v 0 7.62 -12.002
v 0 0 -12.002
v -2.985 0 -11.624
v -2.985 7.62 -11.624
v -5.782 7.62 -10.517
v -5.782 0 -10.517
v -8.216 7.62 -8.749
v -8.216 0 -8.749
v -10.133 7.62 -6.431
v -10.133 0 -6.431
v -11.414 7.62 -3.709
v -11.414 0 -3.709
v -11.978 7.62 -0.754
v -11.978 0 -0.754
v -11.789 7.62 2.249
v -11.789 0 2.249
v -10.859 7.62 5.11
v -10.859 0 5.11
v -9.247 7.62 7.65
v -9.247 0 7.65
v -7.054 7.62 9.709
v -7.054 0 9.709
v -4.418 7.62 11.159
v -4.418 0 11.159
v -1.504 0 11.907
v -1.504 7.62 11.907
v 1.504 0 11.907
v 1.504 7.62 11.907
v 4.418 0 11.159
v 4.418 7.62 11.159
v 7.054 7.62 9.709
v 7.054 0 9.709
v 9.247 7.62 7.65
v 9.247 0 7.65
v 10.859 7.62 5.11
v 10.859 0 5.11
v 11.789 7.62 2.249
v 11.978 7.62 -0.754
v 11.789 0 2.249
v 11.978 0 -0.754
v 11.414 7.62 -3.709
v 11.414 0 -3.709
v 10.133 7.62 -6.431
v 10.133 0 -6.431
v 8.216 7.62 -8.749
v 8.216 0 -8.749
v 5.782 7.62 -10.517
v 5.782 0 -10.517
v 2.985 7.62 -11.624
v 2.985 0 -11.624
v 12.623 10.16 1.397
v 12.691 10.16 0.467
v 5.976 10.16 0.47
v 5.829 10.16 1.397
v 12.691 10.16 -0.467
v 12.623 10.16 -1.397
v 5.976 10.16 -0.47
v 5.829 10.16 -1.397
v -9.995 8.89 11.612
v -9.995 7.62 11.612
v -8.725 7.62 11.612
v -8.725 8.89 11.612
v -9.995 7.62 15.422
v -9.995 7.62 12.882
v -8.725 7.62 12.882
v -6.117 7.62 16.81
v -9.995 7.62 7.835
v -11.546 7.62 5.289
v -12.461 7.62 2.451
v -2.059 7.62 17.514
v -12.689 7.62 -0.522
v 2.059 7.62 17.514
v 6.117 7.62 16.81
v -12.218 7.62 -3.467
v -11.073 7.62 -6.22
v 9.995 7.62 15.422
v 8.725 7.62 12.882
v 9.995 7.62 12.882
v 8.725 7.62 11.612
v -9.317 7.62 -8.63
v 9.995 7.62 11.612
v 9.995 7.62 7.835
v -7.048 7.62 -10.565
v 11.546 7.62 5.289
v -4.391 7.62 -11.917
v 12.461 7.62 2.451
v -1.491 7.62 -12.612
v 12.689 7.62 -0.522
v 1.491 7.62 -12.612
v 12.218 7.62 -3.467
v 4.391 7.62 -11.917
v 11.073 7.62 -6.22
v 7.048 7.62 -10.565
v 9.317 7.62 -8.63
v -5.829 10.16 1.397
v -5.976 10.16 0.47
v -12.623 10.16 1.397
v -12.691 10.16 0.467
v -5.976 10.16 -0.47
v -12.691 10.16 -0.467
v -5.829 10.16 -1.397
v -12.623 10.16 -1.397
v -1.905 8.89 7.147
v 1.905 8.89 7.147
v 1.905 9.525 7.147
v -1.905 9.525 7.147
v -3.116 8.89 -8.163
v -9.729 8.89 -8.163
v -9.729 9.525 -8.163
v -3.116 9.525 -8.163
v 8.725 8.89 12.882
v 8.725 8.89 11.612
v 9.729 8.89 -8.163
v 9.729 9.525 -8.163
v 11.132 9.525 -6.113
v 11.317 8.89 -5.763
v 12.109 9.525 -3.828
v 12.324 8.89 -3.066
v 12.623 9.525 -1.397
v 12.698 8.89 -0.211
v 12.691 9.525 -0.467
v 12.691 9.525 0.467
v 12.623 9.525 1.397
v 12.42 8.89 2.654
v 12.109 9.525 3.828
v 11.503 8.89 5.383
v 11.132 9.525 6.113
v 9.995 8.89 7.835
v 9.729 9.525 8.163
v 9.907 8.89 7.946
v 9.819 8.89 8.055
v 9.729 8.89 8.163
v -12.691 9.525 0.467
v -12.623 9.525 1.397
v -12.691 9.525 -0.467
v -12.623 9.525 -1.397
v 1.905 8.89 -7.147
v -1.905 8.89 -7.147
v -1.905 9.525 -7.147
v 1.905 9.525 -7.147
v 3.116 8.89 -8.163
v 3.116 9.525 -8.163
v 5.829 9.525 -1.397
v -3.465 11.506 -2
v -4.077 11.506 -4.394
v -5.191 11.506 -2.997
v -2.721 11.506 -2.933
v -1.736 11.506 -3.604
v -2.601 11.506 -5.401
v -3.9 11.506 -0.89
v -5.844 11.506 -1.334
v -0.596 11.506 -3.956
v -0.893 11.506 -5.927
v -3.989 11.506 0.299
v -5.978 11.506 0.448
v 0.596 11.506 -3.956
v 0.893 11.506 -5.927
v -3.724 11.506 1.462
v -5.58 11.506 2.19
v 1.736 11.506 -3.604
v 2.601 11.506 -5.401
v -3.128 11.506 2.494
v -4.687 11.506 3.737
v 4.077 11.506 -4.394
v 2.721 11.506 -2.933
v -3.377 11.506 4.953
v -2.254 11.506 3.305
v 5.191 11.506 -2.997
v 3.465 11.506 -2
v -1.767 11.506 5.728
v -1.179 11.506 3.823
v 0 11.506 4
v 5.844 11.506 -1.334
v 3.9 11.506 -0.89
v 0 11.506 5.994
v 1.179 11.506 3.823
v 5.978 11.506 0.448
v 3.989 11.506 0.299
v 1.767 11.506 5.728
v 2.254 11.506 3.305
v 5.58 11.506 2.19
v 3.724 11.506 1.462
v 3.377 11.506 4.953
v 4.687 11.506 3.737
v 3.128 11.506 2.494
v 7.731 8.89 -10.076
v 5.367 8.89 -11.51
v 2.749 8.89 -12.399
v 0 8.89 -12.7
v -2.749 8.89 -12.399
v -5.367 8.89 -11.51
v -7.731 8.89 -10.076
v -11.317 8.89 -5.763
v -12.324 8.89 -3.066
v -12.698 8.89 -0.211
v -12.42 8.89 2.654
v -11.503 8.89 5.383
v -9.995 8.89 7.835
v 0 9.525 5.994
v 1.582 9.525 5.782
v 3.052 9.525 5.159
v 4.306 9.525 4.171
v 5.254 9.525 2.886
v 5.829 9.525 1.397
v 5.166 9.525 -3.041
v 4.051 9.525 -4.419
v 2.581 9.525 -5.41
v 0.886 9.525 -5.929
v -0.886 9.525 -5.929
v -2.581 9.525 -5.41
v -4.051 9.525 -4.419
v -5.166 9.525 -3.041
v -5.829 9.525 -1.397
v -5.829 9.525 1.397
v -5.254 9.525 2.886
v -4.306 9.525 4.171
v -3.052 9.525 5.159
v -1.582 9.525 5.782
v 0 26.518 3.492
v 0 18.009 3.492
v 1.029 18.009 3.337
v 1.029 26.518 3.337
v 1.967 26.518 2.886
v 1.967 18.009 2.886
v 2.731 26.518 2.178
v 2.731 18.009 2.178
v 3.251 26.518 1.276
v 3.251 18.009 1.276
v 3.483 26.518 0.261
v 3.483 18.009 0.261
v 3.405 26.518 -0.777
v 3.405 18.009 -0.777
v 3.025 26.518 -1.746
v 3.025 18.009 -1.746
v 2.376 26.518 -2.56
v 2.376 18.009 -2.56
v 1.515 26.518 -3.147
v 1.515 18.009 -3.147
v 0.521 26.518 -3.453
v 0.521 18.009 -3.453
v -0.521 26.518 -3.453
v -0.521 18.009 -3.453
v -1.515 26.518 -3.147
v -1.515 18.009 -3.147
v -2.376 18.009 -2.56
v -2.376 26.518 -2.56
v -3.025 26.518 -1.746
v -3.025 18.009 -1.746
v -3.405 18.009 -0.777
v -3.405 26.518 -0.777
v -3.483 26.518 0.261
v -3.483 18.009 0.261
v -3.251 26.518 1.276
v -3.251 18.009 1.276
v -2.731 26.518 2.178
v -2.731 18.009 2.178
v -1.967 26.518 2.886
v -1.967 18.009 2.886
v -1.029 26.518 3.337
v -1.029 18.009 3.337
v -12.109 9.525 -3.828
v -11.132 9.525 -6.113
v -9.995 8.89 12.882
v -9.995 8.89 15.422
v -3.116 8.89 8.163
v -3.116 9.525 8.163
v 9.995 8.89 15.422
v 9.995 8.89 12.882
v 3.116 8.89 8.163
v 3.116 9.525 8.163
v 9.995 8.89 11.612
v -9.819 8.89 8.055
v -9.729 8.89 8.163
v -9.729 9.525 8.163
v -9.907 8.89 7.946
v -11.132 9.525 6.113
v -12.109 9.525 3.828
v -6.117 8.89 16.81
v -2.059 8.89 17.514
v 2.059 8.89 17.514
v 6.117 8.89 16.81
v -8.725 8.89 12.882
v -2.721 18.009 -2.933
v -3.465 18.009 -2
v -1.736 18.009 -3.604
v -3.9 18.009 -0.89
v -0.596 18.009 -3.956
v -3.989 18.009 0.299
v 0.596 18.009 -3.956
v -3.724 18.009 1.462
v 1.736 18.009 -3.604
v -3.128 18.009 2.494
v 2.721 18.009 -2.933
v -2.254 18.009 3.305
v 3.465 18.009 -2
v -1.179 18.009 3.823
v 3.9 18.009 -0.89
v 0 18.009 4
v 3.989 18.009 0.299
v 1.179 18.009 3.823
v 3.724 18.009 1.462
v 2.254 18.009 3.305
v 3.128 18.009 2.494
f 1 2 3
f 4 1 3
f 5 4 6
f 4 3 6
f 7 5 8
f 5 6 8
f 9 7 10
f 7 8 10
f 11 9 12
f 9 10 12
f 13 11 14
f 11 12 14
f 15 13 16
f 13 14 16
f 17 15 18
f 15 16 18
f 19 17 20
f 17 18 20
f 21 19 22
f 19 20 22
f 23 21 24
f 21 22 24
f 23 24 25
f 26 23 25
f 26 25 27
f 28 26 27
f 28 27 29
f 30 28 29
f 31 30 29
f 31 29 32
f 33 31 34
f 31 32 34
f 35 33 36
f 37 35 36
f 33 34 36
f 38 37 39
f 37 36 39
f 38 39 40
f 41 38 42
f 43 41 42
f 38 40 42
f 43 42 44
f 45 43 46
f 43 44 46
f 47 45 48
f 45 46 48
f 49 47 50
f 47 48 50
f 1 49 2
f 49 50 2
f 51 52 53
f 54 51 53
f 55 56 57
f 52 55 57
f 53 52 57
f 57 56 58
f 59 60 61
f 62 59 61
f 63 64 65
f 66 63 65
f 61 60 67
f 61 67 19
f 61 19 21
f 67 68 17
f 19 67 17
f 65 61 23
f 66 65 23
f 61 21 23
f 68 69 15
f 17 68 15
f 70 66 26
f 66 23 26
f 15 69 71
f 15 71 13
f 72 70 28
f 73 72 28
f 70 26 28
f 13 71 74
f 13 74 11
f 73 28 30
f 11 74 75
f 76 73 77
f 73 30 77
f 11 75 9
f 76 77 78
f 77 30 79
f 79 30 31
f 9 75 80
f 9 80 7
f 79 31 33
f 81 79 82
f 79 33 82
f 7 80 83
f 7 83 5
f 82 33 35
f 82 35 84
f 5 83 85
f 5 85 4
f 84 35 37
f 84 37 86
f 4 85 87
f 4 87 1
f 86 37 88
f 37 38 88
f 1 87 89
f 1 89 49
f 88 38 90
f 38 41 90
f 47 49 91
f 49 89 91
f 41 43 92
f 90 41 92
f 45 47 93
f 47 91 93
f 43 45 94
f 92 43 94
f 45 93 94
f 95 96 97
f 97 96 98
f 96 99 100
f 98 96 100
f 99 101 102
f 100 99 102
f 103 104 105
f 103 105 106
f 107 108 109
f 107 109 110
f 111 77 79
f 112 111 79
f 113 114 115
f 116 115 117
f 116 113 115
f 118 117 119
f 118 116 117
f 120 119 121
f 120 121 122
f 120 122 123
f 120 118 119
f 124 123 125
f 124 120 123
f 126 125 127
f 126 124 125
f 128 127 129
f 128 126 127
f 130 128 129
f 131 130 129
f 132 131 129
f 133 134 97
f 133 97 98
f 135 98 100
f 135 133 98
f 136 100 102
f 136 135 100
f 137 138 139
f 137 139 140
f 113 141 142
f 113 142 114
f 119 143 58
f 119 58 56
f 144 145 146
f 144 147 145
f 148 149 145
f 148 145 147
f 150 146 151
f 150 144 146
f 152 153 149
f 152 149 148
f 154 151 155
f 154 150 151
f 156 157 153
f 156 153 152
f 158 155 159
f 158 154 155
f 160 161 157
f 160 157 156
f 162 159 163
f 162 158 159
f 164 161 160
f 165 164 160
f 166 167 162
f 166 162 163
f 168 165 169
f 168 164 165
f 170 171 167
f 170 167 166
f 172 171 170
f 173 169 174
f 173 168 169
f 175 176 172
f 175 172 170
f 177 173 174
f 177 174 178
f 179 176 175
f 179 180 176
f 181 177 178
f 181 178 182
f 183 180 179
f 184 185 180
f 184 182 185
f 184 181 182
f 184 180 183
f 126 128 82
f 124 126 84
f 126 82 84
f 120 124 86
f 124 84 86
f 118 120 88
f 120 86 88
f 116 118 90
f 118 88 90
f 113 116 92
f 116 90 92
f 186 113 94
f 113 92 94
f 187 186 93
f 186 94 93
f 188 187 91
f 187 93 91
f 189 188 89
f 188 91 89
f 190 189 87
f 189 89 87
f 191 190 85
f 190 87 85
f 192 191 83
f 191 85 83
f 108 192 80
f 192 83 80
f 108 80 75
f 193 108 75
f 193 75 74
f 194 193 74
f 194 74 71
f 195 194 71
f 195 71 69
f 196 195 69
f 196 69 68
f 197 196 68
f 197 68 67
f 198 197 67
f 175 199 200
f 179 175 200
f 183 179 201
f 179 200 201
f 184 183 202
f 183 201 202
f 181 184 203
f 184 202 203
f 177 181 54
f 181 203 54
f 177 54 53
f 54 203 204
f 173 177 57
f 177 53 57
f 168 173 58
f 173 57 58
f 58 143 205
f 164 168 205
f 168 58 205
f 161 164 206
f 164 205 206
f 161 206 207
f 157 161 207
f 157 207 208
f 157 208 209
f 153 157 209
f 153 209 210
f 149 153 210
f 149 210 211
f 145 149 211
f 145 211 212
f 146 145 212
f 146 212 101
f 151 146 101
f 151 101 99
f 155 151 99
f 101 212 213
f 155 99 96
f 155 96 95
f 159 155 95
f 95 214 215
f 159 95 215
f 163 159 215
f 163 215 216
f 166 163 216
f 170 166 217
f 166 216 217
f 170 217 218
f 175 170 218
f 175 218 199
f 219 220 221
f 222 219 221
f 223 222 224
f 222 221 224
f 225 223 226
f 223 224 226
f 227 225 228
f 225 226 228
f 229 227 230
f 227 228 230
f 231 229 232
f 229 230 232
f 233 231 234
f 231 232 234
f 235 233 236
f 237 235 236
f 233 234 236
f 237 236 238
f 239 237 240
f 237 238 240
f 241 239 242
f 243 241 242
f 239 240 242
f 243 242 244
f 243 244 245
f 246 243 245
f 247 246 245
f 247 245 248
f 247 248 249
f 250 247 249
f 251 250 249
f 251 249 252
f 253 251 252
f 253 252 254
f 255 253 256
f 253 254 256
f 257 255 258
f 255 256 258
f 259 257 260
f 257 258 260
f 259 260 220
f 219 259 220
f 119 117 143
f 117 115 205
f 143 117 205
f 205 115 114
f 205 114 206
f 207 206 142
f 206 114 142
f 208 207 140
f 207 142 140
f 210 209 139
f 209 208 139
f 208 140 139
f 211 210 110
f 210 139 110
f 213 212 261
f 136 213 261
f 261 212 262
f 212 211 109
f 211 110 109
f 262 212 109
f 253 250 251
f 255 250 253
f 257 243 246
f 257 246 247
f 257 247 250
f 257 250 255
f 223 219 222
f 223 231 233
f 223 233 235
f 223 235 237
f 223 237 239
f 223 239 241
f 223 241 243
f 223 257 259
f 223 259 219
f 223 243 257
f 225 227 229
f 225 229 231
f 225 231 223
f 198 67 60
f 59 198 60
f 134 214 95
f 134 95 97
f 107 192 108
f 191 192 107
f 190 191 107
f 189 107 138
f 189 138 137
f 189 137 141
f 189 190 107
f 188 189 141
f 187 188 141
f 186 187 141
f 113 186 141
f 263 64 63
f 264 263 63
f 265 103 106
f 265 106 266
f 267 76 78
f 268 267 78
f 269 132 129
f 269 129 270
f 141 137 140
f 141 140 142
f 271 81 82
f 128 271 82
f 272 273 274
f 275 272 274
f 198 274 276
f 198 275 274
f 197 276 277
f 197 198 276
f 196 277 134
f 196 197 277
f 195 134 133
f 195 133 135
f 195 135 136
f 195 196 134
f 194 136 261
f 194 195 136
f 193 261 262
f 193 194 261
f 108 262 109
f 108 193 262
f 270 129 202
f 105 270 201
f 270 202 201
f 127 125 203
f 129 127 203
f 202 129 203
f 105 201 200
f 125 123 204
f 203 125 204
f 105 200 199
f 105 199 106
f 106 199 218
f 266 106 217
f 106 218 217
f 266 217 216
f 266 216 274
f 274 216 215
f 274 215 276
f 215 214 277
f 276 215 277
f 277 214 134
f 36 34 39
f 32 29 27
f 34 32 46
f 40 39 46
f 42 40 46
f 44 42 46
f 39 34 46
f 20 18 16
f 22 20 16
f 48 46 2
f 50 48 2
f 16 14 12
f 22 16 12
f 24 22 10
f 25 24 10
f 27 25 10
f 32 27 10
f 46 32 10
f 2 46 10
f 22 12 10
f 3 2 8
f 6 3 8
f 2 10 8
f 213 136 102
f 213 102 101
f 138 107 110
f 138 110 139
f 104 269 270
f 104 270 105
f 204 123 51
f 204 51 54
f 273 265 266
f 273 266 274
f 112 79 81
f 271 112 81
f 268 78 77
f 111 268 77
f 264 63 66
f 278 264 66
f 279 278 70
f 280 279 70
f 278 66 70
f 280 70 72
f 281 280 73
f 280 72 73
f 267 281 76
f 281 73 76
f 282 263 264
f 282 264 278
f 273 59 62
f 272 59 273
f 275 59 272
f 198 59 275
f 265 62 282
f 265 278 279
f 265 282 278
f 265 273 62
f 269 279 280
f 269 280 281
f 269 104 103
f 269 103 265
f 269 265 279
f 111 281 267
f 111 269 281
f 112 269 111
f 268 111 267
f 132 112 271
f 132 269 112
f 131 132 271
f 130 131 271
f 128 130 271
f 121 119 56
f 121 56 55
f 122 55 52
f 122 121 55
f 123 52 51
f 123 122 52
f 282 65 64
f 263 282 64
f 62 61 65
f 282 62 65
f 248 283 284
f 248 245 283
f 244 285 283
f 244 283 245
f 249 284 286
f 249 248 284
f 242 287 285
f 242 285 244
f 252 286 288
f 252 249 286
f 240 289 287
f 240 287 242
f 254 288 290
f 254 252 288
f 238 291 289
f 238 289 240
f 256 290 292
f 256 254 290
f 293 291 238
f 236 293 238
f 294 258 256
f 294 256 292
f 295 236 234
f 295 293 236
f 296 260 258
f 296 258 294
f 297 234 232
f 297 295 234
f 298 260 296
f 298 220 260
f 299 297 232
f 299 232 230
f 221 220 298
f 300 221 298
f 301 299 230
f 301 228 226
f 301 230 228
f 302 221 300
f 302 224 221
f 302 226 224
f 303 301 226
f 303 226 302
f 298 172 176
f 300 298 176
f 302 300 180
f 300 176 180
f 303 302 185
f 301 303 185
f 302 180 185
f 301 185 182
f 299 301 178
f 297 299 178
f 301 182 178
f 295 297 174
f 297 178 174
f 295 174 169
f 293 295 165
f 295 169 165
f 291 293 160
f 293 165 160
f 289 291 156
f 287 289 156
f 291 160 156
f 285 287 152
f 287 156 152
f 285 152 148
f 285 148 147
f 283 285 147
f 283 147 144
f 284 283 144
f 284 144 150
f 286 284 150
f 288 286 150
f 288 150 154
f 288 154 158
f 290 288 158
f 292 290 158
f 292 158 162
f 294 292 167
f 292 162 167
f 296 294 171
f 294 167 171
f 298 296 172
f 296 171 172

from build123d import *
from build123d.topology import SkipClean

# Parameters (mm, degrees)
SKETCH1_R           = 12.0015
BOSS_EXTRUDE1_DEPTH = 7.62
SKETCH2_R           = 12.7
BOSS_EXTRUDE2_DEPTH = 1.27
BOSS_EXTRUDE3_START = -1.27
BOSS_EXTRUDE3_DEPTH = 1.27
SKETCH4_R           = 5.9944
BOSS_EXTRUDE4_DEPTH = 2.6162
SKETCH5_R           = 4.0005
BOSS_EXTRUDE5_DEPTH = 6.5024
SKETCH6_R           = 3.4925
BOSS_EXTRUDE6_DEPTH = 8.509
BOSS_EXTRUDE7_DEPTH = 0.635
BOSS_EXTRUDE8_DEPTH = 0.635


with BuildPart() as part:
    # Sketch1 → Boss-Extrude1 (new body)
    with BuildSketch(Plane(origin=(0, 0, 0), x_dir=(1, 0, 0), z_dir=(0, 1, 0))):
        with Locations(Location((0, 0, 0), (0, 0, 90))):
            Circle(SKETCH1_R)
    extrude(amount=BOSS_EXTRUDE1_DEPTH)

    # Sketch2 → Boss-Extrude2 (add)
    with BuildSketch(Plane(origin=(0, 7.62, 0), x_dir=(1, 0, 0), z_dir=(0, 1, 0))):
        with Locations(Location((0, 0, 0), (0, 0, 270))):
            Circle(SKETCH2_R)
    extrude(amount=BOSS_EXTRUDE2_DEPTH)

    # Sketch3 → Boss-Extrude3 (add)
    with BuildSketch(Plane(origin=(0, 8.89, 0), x_dir=(1, 0, 0), z_dir=(0, 1, 0)).offset(BOSS_EXTRUDE3_START)):
        with BuildLine():
            ThreePointArc((9.9949, -7.835303057), (0, -12.7), (-9.9949, -7.835303057))
            Line((-9.9949, -7.835303057), (-9.9949, -11.612260807))
            Line((-9.9949, -11.612260807), (-8.7249, -11.612260807))
            Line((-8.7249, -11.612260807), (-8.7249, -12.882260807))
            Line((-8.7249, -12.882260807), (-9.9949, -12.882260807))
            Line((-9.9949, -12.882260807), (-9.9949, -15.422260807))
            ThreePointArc((-9.9949, -15.422260807), (0, -17.6022), (9.9949, -15.422260807))
            Line((9.9949, -15.422260807), (9.9949, -12.882260807))
            Line((9.9949, -12.882260807), (8.7249, -12.882260807))
            Line((8.7249, -12.882260807), (8.7249, -11.612260807))
            Line((8.7249, -11.612260807), (9.9949, -11.612260807))
            Line((9.9949, -11.612260807), (9.9949, -7.835303057))
        make_face()
    extrude(amount=BOSS_EXTRUDE3_DEPTH)

    # Sketch4 → Boss-Extrude4 (add)
    with BuildSketch(Plane(origin=(0, 8.89, 0), x_dir=(1, 0, 0), z_dir=(0, 1, 0))):
        with Locations(Location((0, 0, 0), (0, 0, 270))):
            Circle(SKETCH4_R)
    extrude(amount=BOSS_EXTRUDE4_DEPTH)

    # Sketch5 → Boss-Extrude5 (add)
    with BuildSketch(Plane(origin=(0, 11.5062, 0), x_dir=(1, 0, 0), z_dir=(0, 1, 0))):
        with Locations(Location((0, 0, 0), (0, 0, 270))):
            Circle(SKETCH5_R)
    extrude(amount=BOSS_EXTRUDE5_DEPTH)

    # Sketch6 → Boss-Extrude6 (add)
    with BuildSketch(Plane(origin=(0, 18.0086, 0), x_dir=(1, 0, 0), z_dir=(0, 1, 0))):
        with Locations(Location((0, 0, 0), (0, 0, 270))):
            Circle(SKETCH6_R)
    extrude(amount=BOSS_EXTRUDE6_DEPTH)

    # Sketch7 → Boss-Extrude7 (add)
    with SkipClean():  # the faces are left unmerged after this step: merging them gives an invalid solid
        with BuildSketch(Plane(origin=(0, 8.89, 0), x_dir=(1, 0, 0), z_dir=(0, 1, 0))):
            with BuildLine():
                Line((-9.728764428, 8.163402643), (-3.11582165, 8.163402643))
                Line((-3.11582165, 8.163402643), (-1.905, 7.147402643))
                Line((-1.905, 7.147402643), (1.905, 7.147402643))
                Line((1.905, 7.147402643), (3.11582165, 8.163402643))
                Line((3.11582165, 8.163402643), (9.728764428, 8.163402643))
                ThreePointArc((9.728764428, 8.163402643), (12.7, 0), (9.728764428, -8.163402643))
                Line((9.728764428, -8.163402643), (3.11582165, -8.163402643))
                Line((3.11582165, -8.163402643), (1.905, -7.147402643))
                Line((1.905, -7.147402643), (-1.905, -7.147402643))
                Line((-1.905, -7.147402643), (-3.11582165, -8.163402643))
                Line((-3.11582165, -8.163402643), (-9.728764428, -8.163402643))
                ThreePointArc((-9.728764428, -8.163402643), (-12.7, 0), (-9.728764428, 8.163402643))
            make_face()
        extrude(amount=BOSS_EXTRUDE7_DEPTH)

    # Sketch8 → Boss-Extrude8 (add)
    with SkipClean():  # the faces are left unmerged after this step: merging them gives an invalid solid
        with BuildSketch(Plane(origin=(0, 9.525, 0), x_dir=(1, 0, 0), z_dir=(0, 1, 0))):
            with BuildLine():
                Line((-12.622931157, 1.397), (12.622931157, 1.397))
                ThreePointArc((12.622931157, 1.397), (12.7, 0), (12.622931157, -1.397))
                Line((12.622931157, -1.397), (-12.622931157, -1.397))
                ThreePointArc((-12.622931157, -1.397), (-12.7, 0), (-12.622931157, 1.397))
            make_face()
        extrude(amount=BOSS_EXTRUDE8_DEPTH)


solid = part.part
